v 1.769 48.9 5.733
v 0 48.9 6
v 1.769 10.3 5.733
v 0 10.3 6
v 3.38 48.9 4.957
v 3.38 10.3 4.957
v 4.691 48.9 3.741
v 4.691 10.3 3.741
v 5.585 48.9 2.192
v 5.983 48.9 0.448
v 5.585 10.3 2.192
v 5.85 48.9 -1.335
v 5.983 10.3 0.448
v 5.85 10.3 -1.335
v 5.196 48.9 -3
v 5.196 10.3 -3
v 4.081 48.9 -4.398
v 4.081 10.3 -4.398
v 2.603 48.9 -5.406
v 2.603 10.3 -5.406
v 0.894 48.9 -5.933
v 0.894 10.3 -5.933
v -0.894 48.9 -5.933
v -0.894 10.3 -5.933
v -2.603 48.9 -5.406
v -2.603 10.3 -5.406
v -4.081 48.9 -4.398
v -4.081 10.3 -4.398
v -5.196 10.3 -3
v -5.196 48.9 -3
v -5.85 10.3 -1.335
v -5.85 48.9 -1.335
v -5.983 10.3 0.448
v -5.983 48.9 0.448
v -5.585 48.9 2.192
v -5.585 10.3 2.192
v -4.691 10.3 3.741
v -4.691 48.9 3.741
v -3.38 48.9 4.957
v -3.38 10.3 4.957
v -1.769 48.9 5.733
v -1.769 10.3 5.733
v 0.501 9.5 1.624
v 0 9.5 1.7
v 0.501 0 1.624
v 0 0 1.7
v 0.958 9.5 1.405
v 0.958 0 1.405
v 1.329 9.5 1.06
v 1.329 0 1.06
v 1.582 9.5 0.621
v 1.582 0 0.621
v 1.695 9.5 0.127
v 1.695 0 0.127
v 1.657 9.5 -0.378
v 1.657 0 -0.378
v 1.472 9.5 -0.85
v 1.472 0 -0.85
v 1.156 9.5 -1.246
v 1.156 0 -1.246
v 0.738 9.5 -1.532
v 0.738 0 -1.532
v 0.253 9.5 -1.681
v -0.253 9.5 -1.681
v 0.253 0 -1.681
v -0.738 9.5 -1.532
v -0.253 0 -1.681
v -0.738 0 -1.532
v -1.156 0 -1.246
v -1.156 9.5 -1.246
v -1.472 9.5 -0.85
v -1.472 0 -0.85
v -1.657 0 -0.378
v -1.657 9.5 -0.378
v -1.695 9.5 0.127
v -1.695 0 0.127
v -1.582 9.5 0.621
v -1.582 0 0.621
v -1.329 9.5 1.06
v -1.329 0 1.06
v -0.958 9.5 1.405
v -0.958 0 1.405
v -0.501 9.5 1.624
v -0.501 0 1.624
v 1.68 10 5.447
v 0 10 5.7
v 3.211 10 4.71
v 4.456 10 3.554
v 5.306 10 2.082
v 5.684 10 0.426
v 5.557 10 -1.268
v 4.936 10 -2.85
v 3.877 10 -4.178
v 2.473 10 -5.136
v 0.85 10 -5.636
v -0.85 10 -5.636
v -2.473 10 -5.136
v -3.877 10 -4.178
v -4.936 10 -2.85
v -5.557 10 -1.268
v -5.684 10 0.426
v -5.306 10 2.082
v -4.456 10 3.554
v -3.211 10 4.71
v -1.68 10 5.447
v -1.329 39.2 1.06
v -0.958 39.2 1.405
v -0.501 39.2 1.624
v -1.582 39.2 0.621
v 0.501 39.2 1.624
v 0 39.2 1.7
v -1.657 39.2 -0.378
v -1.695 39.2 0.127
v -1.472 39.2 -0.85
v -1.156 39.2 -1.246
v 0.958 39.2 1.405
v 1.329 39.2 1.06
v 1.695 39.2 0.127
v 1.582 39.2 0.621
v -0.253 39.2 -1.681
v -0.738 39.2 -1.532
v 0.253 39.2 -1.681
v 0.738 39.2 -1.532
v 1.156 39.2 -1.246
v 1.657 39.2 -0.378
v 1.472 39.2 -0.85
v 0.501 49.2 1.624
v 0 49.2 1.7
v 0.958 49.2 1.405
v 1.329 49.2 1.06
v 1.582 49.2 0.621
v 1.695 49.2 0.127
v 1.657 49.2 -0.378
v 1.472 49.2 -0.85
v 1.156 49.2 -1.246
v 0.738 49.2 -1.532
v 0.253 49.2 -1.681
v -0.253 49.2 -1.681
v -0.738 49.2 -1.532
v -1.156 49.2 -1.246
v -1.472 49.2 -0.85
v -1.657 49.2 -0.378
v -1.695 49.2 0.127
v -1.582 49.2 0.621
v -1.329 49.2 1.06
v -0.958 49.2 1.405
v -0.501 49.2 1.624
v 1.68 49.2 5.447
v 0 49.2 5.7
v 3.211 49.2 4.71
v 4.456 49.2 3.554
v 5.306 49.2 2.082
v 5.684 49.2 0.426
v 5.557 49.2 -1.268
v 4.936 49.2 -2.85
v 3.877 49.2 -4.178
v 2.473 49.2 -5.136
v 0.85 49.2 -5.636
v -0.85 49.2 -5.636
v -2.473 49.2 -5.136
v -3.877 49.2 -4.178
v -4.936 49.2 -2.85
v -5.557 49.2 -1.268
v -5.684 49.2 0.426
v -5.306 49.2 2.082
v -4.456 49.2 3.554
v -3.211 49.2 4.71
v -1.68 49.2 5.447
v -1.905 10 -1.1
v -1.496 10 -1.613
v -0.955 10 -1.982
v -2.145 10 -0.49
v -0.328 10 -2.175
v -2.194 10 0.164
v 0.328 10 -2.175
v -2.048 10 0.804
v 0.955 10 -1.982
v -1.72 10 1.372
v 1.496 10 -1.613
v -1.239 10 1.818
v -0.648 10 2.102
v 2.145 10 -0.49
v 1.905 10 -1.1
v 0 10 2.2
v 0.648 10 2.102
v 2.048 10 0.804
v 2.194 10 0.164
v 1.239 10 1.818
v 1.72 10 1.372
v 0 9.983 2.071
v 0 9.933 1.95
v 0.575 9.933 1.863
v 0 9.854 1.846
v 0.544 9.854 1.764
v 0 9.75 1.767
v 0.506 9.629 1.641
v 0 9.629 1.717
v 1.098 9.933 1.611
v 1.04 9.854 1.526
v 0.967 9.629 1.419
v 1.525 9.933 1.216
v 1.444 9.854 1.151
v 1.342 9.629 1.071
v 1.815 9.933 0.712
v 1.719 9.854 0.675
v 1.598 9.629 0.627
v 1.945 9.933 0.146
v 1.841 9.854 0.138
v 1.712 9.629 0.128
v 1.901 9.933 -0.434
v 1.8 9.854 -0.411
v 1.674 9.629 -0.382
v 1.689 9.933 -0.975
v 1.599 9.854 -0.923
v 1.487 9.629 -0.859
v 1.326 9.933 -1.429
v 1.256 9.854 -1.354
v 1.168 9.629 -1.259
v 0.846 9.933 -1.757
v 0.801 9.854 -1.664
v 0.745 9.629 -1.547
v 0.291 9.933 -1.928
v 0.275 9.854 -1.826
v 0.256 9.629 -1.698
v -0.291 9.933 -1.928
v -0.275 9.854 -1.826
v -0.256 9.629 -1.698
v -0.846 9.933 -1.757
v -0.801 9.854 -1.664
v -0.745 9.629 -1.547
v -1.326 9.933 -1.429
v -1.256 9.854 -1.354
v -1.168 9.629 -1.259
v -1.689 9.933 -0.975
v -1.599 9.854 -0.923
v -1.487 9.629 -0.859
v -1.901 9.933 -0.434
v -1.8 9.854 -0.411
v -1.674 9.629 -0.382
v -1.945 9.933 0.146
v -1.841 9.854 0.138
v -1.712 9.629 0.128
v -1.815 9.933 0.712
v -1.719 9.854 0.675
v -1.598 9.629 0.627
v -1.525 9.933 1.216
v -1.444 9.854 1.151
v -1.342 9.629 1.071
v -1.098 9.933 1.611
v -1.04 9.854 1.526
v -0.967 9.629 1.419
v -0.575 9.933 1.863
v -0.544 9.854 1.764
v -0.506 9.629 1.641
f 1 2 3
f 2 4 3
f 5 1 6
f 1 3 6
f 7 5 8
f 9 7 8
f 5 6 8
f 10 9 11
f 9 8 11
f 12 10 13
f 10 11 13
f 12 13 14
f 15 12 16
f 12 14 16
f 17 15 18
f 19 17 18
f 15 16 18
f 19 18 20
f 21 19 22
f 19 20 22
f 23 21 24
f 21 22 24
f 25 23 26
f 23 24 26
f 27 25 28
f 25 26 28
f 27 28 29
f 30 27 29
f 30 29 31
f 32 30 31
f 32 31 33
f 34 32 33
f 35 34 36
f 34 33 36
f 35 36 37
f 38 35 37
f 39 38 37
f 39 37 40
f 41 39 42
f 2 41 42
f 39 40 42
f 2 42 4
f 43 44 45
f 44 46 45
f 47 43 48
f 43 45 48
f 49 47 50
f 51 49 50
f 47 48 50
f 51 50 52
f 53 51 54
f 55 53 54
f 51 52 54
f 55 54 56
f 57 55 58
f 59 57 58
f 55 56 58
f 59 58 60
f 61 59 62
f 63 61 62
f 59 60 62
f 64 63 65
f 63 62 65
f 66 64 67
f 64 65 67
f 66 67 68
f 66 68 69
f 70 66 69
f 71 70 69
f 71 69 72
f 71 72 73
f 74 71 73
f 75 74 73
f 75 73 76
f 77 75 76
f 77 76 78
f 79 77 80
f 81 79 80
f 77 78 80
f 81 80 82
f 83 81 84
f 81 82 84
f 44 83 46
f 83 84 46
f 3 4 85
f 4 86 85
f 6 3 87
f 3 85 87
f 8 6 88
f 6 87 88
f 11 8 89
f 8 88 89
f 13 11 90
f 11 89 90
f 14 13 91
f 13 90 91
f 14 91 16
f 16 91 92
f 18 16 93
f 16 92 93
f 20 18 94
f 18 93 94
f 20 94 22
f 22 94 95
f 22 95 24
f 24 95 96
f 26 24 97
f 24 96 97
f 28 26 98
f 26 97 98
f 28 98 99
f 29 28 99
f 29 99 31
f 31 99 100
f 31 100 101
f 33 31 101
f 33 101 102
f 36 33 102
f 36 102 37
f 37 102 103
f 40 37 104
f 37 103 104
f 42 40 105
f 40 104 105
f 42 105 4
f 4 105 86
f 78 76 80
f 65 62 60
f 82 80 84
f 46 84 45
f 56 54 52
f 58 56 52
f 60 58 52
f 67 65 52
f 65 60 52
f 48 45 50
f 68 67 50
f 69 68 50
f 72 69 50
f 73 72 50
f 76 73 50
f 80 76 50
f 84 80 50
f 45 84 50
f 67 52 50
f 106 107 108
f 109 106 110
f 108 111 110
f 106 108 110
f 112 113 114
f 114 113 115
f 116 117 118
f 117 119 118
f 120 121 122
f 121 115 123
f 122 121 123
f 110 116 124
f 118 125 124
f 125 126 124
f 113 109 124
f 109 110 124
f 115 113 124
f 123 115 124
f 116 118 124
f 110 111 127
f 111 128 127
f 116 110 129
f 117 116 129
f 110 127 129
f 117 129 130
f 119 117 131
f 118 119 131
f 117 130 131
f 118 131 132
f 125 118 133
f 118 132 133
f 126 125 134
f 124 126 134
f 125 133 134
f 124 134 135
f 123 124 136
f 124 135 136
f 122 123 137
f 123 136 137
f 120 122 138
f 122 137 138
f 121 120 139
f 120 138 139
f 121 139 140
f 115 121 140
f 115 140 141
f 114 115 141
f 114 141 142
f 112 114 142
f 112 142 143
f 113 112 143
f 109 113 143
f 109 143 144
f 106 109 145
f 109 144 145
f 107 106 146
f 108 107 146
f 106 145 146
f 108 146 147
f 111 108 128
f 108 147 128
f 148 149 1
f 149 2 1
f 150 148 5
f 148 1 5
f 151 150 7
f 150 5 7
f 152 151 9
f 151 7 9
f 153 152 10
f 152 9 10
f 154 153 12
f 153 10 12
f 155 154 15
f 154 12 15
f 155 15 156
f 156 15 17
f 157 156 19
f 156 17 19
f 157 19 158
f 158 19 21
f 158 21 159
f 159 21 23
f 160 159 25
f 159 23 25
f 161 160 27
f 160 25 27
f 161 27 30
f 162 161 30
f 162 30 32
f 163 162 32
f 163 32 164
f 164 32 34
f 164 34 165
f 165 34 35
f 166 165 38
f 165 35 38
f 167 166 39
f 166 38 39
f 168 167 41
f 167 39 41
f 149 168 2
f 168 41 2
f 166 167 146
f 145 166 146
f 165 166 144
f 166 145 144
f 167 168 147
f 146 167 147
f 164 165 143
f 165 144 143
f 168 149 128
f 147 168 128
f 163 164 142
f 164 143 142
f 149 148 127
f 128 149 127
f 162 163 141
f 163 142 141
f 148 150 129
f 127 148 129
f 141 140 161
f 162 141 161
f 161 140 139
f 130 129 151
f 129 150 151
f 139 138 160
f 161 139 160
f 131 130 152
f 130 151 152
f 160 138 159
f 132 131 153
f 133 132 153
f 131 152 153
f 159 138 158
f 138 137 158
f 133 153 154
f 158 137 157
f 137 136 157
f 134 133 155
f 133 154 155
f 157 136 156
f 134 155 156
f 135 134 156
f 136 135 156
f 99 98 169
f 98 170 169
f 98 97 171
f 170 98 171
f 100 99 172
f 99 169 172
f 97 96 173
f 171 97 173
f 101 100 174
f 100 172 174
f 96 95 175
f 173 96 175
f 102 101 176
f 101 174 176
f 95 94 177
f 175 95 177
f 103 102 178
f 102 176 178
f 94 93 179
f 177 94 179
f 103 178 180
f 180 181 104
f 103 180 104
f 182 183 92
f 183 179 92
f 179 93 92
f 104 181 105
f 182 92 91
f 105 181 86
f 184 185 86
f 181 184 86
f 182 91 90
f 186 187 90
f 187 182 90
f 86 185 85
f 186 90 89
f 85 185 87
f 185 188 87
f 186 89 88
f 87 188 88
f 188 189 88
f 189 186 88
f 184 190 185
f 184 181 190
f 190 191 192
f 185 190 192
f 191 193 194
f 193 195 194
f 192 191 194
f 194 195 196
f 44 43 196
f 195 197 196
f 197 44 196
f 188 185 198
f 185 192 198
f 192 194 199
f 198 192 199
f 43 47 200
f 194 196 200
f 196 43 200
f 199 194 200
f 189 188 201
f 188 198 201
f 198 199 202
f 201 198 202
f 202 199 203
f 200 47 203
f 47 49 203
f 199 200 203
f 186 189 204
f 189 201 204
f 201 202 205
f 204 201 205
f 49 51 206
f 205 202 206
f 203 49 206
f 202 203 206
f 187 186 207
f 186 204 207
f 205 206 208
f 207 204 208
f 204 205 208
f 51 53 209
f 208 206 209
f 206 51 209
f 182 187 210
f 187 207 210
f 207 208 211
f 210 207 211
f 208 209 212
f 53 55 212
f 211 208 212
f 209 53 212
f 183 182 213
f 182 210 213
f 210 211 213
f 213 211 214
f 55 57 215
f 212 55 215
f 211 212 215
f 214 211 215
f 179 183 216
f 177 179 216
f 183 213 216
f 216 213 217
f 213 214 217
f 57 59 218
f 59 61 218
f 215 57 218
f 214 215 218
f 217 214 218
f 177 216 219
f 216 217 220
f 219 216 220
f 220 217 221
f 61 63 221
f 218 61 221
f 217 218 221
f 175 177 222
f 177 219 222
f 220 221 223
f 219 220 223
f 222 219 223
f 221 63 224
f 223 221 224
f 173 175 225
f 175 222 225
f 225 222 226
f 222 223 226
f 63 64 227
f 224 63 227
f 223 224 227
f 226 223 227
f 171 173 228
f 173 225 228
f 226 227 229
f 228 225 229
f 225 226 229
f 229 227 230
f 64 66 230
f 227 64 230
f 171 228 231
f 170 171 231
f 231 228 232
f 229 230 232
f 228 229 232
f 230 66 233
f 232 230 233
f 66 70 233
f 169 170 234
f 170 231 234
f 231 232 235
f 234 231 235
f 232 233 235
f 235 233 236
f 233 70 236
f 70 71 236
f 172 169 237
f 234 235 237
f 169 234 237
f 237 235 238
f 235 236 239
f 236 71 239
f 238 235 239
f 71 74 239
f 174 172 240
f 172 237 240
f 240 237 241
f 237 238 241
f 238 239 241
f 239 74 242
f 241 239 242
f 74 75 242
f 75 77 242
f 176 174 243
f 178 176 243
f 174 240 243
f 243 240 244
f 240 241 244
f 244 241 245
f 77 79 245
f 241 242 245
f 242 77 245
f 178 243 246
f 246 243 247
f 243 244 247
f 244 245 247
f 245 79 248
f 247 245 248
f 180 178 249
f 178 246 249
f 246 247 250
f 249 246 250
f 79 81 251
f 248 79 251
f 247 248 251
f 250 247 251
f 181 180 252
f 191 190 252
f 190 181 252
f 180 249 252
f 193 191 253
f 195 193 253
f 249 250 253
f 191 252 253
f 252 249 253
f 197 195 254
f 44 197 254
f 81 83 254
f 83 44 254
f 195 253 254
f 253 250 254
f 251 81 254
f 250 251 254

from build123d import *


with BuildPart() as part:
    # Esboço1 → Revolução1 (revolve)
    with BuildSketch(Plane(origin=(0, 0, 0), x_dir=(-1, 0, 0), z_dir=(0, 0, -1)), mode=Mode.PRIVATE) as revolu_o1_sk:
        with BuildLine():
            Line((-1.7, 0), (0, 0))
            Line((0, 0), (0, 39.2))
            Line((0, 39.2), (-1.7, 39.2))
            Line((-1.7, 39.2), (-1.7, 49.2))
            Line((-1.7, 49.2), (-5.7, 49.2))
            Line((-5.7, 49.2), (-6, 48.9))
            Line((-6, 48.9), (-6, 10.3))
            Line((-6, 10.3), (-5.7, 10))
            Line((-5.7, 10), (-2.2, 10))
            ThreePointArc((-2.2, 10), (-1.846446609, 9.853553391), (-1.7, 9.5))
            Line((-1.7, 9.5), (-1.7, 0))
        make_face()
    revolve(revolu_o1_sk.sketch.rotate(Axis((0, 0, 0), (0, 1, 0)), 270), axis=Axis((0, 0, 0), (0, 1, 0)))


solid = part.part
